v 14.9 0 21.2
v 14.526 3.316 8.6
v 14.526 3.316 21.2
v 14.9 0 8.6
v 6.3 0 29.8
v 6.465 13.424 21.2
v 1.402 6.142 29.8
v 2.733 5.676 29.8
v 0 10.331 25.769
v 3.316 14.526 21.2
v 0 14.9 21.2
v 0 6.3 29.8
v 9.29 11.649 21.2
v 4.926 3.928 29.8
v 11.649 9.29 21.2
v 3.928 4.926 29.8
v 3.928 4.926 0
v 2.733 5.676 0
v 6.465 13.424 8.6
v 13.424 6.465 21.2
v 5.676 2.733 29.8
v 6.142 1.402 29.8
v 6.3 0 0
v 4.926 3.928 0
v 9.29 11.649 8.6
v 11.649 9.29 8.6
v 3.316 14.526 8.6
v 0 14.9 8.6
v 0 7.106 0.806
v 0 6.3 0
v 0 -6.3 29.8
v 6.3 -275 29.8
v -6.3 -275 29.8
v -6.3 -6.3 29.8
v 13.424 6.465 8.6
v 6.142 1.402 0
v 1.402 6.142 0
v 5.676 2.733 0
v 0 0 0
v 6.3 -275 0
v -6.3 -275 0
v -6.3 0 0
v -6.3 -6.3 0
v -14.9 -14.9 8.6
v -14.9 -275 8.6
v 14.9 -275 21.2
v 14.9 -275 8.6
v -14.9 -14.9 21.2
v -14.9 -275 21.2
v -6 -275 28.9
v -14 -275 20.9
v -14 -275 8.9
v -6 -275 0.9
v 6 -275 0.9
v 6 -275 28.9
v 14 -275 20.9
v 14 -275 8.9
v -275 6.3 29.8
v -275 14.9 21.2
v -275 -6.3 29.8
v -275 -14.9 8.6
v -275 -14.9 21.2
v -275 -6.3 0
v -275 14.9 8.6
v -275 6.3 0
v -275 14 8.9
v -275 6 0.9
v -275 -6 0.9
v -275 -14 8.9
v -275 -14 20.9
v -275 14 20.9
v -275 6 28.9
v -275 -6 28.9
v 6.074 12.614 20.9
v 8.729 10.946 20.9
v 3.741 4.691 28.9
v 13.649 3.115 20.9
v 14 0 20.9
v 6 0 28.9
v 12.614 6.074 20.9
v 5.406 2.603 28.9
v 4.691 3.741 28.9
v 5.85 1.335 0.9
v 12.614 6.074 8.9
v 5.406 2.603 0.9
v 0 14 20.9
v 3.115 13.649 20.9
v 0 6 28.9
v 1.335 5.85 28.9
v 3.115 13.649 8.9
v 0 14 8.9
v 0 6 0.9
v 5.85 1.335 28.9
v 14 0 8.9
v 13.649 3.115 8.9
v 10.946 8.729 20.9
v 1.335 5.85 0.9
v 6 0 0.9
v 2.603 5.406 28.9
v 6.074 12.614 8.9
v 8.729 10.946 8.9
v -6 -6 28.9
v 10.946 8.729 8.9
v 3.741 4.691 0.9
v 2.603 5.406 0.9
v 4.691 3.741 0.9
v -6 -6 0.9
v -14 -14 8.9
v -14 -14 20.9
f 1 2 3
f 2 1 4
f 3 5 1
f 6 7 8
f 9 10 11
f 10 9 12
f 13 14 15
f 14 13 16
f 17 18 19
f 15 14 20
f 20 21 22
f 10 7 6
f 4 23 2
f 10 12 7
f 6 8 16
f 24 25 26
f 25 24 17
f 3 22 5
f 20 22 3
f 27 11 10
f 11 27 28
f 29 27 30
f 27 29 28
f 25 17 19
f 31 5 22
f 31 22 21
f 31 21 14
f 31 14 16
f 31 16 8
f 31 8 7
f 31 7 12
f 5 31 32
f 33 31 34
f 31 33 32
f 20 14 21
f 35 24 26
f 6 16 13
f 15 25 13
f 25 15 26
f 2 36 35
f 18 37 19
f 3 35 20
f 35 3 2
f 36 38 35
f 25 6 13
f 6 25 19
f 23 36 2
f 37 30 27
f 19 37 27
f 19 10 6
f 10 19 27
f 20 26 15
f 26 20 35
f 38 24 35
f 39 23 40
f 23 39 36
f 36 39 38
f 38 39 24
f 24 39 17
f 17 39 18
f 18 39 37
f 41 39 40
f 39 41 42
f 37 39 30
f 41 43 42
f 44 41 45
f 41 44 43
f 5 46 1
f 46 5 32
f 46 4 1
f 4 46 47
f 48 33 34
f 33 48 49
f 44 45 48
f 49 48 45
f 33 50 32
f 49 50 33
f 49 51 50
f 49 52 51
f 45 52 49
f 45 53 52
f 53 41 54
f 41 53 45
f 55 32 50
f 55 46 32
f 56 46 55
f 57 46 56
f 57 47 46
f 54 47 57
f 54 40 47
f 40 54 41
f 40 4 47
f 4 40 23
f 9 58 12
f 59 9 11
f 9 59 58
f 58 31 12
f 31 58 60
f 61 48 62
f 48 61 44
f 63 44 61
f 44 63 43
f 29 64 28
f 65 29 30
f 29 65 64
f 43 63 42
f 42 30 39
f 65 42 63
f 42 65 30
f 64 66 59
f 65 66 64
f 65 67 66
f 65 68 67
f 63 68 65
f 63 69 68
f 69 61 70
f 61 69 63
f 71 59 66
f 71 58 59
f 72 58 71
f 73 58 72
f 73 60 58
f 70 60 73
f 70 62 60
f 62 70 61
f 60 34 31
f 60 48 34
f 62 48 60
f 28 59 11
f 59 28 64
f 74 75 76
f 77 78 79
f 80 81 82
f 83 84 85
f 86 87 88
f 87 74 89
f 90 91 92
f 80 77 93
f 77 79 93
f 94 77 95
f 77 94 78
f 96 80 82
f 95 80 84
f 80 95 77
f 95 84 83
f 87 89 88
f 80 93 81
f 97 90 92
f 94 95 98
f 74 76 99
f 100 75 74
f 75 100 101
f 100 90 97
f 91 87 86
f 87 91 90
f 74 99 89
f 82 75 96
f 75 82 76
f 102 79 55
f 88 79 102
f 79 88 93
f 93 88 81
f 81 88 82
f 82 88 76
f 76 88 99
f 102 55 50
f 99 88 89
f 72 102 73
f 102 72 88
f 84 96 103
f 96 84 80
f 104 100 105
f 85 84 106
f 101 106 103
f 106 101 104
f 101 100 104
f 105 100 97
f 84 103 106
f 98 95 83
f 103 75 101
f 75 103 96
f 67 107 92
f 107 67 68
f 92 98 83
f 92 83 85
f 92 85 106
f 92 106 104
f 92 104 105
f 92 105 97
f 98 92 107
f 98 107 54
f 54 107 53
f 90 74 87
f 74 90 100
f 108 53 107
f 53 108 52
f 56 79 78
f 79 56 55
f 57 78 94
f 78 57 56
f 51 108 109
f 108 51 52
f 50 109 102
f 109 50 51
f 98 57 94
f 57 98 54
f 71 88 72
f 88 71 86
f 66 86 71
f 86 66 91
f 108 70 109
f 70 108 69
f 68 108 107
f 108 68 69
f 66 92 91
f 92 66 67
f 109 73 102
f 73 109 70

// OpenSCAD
wall = 0.6;
radius = 8;
width = 12;
height = 275;
coupler_height = 60;
coupler_buffer = 1;
fullwidth = width+radius*2 +wall*2;

winkel_hollow(width, height, radius, wall);
//translate([0,0,-1.5*wall])
//coupler(width, coupler_height, radius, wall, coupler_buffer);

module coupler(w, h, r, t, cb)
{
    cw = w + 3*t;
    rotate([90,0,0])
    difference()
    {
        tonne(cw+t, h, r+t);
        translate([0,t,-t])
        tonne(cw,h+2*t,r);
    }
    translate([0,-h/2-cb/2,-t])
    buffer(w,r,t,cb);
}

module buffer(w, r, t, cb)
{
    difference()
    {
        translate([0,0,t])
        rotate([90,0,0])
        tonne(w+3*t, cb, r+t);
        translate([0,t,3.5*t])
        rotate([90,0,0])
        tonne(w, cb+2*t, r);
    }
}

module winkel_hollow(w, h, r, t)
{
    difference()
    {
        winkel_solid(width+wall, height, radius+wall);
        translate([0,0,1.5*t])
        winkel_solid(width, height+t, radius);
    }
}

module winkel_solid (w, h, r)
{
    corner(w, r);

    rotate([90,0,0])
    tonne(w, h, r);

    rotate([0,-90,0])
    translate([w/2 + r, -w/2 - r,0])
    tonne(w, h, r);

}

module tonne (w, h, r)
{
    linear_extrude(h, convexity=2)
    {
        polygon(concat([[0,0],
                    [w/2,0],
                    [r+w/2, r],
                    [r+w/2, r+w],
                    [w/2, 2*r+w],
                    [-w/2, 2*r+w],
                    [-r-w/2, r+w],
                    [-w/2-r, r],
                    [-w/2, 0],
                    ]));
    }

}

module corner (w, r)
{
    rotate_extrude(angle=90, convexity=2)
    {
        polygon(concat([[0,0],
                        [w/2,0],
                        [r+w/2, r],
                        [r+w/2, r+w],
                        [w/2, 2*r+w],
                        [0, 2*r+w]]));
    }
}
